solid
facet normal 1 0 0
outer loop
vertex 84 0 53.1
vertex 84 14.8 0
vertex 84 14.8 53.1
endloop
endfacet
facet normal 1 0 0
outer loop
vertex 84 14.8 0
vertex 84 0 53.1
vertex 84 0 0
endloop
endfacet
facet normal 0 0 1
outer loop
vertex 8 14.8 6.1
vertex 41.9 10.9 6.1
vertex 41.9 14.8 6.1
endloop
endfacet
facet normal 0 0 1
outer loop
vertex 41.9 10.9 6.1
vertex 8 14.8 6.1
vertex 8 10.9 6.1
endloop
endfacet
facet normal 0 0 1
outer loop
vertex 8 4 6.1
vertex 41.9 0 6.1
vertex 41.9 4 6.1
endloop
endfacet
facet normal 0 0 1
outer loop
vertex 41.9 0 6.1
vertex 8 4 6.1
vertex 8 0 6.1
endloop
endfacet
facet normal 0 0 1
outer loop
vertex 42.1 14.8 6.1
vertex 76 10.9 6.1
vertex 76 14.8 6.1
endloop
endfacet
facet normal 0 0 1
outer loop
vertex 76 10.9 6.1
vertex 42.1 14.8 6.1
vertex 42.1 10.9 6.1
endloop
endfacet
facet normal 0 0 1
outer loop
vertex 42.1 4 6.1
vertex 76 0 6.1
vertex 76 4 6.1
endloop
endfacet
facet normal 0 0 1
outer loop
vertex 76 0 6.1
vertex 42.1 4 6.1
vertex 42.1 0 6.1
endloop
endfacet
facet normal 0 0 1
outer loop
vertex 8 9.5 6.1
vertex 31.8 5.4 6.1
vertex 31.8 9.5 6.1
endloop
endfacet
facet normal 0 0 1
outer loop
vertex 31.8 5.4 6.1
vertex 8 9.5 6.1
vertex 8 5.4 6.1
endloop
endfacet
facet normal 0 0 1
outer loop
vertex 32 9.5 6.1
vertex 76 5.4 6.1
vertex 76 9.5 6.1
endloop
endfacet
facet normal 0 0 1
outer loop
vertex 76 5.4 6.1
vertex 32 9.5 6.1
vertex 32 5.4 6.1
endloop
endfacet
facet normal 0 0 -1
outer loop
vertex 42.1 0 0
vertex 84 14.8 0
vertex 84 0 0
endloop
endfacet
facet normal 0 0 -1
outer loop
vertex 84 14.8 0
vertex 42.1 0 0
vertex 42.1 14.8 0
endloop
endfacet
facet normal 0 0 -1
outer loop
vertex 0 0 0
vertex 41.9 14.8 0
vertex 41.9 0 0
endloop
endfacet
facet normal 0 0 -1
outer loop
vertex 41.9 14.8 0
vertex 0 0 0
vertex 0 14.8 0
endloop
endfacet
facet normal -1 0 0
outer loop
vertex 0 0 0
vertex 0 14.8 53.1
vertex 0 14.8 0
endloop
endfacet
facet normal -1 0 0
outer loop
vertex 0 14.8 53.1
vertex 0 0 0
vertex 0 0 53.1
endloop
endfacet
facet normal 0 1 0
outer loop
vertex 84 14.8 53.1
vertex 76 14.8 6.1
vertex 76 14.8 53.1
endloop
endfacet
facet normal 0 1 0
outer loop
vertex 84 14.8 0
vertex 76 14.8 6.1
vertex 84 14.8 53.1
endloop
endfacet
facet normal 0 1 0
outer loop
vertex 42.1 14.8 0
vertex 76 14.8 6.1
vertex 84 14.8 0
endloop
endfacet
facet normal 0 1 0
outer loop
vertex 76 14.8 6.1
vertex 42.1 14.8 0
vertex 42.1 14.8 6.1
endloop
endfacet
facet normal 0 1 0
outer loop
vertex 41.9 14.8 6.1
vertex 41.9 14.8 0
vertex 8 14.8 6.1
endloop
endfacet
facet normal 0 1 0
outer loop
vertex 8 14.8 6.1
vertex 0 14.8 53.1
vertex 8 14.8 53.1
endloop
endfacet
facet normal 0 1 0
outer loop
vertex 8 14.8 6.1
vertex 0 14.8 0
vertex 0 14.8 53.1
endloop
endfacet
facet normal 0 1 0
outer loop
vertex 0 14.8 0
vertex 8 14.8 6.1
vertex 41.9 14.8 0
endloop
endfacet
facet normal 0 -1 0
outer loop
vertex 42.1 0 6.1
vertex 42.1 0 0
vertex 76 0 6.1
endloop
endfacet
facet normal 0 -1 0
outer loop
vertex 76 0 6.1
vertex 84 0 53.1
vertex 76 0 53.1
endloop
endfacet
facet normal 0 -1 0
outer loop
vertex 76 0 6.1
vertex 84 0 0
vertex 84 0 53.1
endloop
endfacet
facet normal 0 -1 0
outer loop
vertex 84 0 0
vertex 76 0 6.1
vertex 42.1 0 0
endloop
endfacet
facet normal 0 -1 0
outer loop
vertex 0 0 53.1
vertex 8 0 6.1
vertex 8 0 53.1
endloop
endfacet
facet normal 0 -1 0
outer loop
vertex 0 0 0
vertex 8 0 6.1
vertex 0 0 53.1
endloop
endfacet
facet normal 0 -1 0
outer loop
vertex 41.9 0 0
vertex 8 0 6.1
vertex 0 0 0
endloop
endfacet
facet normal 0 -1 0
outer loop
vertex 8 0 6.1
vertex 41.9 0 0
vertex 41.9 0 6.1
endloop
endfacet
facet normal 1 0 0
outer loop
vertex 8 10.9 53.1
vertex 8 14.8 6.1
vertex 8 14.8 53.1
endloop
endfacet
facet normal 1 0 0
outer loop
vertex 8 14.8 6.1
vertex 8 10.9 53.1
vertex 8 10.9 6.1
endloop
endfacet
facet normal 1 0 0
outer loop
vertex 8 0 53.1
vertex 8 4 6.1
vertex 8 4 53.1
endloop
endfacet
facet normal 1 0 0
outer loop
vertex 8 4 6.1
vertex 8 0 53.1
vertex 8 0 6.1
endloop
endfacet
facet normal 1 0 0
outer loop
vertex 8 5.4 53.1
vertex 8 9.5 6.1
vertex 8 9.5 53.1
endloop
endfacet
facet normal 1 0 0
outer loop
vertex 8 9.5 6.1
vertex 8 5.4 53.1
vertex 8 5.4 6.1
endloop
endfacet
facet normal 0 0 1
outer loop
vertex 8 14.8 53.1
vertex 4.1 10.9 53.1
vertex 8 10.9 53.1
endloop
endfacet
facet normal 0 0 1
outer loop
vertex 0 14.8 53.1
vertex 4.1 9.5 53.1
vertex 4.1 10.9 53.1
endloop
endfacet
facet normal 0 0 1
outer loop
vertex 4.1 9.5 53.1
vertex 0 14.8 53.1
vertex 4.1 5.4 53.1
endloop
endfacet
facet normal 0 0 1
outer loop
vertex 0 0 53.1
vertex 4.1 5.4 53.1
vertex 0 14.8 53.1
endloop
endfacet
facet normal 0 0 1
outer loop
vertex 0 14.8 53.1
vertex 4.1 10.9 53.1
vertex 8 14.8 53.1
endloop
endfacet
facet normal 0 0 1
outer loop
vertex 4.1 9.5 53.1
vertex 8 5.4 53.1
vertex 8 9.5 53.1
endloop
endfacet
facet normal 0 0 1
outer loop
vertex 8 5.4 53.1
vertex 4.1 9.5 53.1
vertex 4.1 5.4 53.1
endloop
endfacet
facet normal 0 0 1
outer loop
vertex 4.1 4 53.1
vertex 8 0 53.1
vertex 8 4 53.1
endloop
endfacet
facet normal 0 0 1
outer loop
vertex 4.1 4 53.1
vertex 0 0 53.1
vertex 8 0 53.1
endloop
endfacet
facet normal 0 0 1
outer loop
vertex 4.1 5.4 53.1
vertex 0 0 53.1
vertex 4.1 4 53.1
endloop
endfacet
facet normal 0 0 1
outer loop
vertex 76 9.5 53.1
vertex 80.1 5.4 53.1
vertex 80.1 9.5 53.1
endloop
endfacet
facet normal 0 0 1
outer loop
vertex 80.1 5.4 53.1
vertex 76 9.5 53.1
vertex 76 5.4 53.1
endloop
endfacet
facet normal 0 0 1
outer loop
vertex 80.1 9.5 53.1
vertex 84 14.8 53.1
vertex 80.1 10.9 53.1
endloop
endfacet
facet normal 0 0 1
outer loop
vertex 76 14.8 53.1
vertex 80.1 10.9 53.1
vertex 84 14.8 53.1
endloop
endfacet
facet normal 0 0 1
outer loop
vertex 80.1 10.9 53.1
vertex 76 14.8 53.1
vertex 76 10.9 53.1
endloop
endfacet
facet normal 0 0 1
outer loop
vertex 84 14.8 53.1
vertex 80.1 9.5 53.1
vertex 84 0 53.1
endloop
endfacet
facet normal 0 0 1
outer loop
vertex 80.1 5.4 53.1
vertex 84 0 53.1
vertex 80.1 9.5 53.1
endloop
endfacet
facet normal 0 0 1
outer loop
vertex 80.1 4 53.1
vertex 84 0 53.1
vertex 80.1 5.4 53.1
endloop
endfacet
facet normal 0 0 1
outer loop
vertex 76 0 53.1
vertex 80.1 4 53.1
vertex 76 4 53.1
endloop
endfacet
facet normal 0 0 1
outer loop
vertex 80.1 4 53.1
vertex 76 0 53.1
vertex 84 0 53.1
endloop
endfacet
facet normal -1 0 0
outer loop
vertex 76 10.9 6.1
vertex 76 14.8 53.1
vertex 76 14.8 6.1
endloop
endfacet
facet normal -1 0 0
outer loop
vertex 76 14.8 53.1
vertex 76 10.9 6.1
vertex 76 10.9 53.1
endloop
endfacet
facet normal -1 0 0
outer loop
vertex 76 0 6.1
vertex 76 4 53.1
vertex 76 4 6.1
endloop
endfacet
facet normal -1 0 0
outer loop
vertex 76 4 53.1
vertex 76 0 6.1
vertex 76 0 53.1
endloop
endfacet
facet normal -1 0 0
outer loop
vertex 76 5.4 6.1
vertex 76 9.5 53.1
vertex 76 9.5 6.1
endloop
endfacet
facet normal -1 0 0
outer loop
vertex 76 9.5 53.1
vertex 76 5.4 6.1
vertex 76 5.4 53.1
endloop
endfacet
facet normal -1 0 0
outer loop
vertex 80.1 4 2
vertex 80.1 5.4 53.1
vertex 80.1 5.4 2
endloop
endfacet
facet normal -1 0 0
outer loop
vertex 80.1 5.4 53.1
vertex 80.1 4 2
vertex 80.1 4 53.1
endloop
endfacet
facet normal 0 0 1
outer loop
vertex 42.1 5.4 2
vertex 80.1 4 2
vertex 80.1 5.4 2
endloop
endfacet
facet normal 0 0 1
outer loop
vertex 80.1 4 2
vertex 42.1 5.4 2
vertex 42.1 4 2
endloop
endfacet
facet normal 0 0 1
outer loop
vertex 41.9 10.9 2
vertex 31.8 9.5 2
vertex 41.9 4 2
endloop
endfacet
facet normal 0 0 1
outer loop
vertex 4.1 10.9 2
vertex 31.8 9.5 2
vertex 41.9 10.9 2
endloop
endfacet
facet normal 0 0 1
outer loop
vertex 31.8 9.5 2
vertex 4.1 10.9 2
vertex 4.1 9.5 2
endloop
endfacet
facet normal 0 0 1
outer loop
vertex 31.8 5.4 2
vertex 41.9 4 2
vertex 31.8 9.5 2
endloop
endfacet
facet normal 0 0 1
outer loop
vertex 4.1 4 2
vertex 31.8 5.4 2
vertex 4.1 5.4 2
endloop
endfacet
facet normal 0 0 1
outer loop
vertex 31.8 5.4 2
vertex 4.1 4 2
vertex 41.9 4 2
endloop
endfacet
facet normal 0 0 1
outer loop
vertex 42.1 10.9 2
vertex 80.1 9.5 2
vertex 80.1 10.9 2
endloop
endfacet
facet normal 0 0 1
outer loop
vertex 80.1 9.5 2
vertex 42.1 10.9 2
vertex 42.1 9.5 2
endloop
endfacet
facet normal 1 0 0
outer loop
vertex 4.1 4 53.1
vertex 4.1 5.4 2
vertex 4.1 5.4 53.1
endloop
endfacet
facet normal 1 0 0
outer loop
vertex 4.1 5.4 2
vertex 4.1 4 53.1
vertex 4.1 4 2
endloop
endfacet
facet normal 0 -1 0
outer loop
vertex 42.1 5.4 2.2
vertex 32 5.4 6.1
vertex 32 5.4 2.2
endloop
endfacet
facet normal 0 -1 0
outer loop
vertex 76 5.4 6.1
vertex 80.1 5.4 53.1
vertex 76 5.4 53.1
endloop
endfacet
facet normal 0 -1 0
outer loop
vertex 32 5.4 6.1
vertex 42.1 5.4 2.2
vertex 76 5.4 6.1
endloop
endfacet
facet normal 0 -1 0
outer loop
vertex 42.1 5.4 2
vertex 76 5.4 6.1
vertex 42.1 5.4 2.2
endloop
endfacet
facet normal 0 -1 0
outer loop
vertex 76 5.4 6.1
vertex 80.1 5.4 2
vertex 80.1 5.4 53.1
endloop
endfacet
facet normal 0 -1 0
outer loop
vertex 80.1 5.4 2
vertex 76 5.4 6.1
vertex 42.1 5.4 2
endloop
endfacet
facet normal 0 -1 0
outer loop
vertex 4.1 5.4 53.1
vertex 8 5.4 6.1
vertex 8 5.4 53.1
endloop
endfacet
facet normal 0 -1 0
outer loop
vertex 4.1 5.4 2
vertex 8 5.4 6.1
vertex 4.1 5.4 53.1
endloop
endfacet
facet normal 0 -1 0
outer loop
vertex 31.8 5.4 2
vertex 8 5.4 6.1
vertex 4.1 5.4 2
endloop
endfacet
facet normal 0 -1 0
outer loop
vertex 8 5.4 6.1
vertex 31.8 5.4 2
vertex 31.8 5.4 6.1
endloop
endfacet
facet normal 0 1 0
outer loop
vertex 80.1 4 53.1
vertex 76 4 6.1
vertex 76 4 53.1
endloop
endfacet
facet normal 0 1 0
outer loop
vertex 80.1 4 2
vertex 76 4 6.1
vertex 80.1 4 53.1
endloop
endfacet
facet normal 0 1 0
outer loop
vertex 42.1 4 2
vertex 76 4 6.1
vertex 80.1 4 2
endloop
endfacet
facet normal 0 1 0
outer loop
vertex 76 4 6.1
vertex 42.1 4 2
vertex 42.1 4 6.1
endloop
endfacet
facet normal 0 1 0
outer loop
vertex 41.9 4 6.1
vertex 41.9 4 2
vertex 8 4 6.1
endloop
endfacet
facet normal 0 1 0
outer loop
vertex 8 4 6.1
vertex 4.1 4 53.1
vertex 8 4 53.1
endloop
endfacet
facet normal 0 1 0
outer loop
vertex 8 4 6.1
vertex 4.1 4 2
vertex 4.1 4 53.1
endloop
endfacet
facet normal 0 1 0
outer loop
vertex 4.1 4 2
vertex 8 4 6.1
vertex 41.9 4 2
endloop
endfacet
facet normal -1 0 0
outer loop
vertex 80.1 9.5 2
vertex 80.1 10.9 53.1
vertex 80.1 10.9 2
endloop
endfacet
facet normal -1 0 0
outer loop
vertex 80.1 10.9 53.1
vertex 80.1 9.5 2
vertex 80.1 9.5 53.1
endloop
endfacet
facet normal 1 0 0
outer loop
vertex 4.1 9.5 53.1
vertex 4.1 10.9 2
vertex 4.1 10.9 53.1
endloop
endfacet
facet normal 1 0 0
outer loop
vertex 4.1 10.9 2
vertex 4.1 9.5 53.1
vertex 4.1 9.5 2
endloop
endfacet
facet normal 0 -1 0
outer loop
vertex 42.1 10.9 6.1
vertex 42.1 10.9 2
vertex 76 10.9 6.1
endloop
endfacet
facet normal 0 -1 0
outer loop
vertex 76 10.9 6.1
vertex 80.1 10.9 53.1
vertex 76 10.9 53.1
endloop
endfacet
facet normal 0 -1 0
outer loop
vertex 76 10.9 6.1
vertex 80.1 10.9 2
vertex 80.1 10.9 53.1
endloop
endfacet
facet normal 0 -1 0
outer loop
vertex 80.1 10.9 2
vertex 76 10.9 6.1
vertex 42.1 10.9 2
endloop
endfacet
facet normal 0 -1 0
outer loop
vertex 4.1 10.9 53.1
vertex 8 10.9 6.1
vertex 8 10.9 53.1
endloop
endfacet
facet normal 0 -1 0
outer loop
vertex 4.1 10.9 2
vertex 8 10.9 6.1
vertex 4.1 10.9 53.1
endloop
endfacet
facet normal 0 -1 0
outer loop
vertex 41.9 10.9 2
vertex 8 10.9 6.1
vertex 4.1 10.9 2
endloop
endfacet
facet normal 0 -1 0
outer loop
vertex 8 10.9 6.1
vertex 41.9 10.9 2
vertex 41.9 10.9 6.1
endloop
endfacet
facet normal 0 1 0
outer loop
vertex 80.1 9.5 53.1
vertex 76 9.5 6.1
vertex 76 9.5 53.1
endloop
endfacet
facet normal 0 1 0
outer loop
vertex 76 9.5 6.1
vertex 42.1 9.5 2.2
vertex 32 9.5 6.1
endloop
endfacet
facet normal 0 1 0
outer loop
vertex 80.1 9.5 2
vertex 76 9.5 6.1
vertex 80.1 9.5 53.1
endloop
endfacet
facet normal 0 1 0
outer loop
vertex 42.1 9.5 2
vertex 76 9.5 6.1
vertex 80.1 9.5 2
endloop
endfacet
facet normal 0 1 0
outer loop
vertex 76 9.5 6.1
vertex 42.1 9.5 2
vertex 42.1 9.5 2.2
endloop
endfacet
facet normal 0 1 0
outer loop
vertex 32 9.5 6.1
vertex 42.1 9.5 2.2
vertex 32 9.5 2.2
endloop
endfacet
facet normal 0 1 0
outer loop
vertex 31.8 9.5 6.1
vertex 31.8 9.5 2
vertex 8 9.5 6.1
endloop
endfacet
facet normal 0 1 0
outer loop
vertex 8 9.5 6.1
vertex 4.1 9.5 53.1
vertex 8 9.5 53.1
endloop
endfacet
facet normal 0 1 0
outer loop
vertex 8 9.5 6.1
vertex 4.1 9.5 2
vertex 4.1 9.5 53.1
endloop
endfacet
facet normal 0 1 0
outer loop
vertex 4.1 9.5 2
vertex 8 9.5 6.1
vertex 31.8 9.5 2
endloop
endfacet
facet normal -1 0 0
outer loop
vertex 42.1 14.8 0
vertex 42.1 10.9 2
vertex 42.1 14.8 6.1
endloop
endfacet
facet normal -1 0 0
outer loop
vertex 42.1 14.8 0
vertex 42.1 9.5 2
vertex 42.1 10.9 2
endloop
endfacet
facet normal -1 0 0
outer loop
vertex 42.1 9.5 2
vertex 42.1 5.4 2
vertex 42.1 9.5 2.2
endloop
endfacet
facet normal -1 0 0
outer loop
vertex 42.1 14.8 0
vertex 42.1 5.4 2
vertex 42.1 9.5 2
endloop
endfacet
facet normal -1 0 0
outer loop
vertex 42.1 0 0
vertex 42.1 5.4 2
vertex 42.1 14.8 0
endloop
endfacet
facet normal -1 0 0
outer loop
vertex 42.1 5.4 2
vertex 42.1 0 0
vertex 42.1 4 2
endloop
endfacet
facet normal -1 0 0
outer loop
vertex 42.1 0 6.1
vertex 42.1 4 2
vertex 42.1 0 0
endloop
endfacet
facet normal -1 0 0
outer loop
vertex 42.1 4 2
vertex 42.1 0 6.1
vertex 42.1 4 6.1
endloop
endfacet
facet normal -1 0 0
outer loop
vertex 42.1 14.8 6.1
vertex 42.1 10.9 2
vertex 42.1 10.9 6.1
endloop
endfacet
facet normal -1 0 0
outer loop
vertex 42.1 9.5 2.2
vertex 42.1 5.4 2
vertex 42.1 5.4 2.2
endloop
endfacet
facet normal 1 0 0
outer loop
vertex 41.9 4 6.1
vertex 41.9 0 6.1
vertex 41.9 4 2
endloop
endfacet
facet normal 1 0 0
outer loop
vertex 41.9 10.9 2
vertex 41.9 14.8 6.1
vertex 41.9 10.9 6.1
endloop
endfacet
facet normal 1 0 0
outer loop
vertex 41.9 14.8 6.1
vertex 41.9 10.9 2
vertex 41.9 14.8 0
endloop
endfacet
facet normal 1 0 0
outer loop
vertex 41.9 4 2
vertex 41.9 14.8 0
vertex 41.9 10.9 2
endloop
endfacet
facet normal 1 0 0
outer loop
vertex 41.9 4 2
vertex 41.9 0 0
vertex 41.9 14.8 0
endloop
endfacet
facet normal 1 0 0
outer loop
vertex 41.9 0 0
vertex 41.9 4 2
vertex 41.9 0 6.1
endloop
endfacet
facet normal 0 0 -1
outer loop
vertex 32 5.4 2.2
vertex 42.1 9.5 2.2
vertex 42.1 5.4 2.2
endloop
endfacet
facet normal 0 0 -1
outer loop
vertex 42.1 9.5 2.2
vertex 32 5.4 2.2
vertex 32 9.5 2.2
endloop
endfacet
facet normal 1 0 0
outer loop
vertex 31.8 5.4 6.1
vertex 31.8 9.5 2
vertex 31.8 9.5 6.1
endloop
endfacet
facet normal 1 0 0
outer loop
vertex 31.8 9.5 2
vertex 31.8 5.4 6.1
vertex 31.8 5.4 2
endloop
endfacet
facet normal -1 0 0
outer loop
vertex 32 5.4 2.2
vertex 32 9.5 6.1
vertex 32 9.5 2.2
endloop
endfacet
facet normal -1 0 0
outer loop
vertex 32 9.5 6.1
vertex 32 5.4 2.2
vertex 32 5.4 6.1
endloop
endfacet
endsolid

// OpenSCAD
slide_thickness = 1.2;
slide_width = 75.8; //75.8 for smaller slides
slide_height = 51;
interlock = .1;
layer_offset = 4;
bottom_thickness = 2;
holder_height = 4;
side_height = slide_height ;//8;
holder_thickness = 4;
corner_width = 10;

front = 0;
first_hole_front = front + holder_thickness;
first_hole_back = holder_thickness + interlock *2 + slide_thickness;
second_hole_front = first_hole_back + layer_offset + interlock;
second_hole_back = second_hole_front + slide_thickness + interlock;
back = second_hole_back + holder_thickness;

block_depth = back;
block_width = slide_width + interlock*2 + holder_thickness*2;
block_thickness = holder_height + bottom_thickness + interlock;

skirt_width = 5;

cut_width =  interlock*2;
cut_offset = 10;

module slide(){
    cube([slide_width, slide_thickness, slide_height]);
}

module slideHole(){
    cube([slide_width+interlock*2, slide_thickness + interlock*2, slide_height+interlock*2]);
}

module side(){
    cube([holder_thickness + holder_height, block_depth, side_height + bottom_thickness + interlock]);
}

module skirt() {
    cube([block_width + skirt_width*2, block_depth + skirt_width*2,bottom_thickness]);
}

module bottom(){
    cube([block_width, block_depth, block_thickness]);
    translate([-skirt_width,-skirt_width,0]){
        //skirt();
    }
    
}

module middleOffsetCut(){
    cube([cut_width, layer_offset + slide_thickness *2 + interlock*4, holder_thickness + interlock*2]);
}

module middleUnderCut(){
    cube([cut_offset + cut_width, layer_offset + slide_thickness *2 + interlock*4, cut_width]);
}

module middleBottomCut(){
    cube([cut_width, layer_offset + slide_thickness *2 + interlock*4, bottom_thickness + interlock*3]);
}

module outsideCut(){
    cube([cut_width, holder_thickness + interlock*2, block_thickness + interlock*2]);
}

module holder(){
    difference(){
        block();
        translate([holder_thickness + interlock, first_hole_front, bottom_thickness])
        {
            slideHole();   
        }
        translate([holder_thickness + interlock, second_hole_front, bottom_thickness]){
            slideHole();
        }
    }
}  

module block(){
        bottom();
        side();
        translate([block_width - holder_thickness - holder_height,0,0]){
            side();
        }
}

module cutHolder(){
    difference(){
        holder();
        translate([block_width/2 - cut_width/2,-interlock,-interlock]){
            #outsideCut();
        }
        translate([block_width/2 - cut_width/2,second_hole_back-interlock,-interlock]){
            #outsideCut();
        }
        translate([block_width/2 - cut_width/2, first_hole_front,-interlock]){
            #middleBottomCut();
        }
        translate([block_width/2 - cut_offset - cut_width, first_hole_front, bottom_thickness]){
            #middleUnderCut();
        }
        translate([block_width/2 - cut_offset - cut_width, first_hole_front, bottom_thickness]){
            #middleOffsetCut();
        }
    }
}

module halfHolder(){
    difference(){
        holder();
        translate([block_width/2,-skirt_width -1,0]){
            cube([block_width/2 + skirt_width + 1, block_depth + skirt_width*2 + 1, side_height + holder_height + interlock]);
        }
    }
}

cutHolder();
//halfHolder();
